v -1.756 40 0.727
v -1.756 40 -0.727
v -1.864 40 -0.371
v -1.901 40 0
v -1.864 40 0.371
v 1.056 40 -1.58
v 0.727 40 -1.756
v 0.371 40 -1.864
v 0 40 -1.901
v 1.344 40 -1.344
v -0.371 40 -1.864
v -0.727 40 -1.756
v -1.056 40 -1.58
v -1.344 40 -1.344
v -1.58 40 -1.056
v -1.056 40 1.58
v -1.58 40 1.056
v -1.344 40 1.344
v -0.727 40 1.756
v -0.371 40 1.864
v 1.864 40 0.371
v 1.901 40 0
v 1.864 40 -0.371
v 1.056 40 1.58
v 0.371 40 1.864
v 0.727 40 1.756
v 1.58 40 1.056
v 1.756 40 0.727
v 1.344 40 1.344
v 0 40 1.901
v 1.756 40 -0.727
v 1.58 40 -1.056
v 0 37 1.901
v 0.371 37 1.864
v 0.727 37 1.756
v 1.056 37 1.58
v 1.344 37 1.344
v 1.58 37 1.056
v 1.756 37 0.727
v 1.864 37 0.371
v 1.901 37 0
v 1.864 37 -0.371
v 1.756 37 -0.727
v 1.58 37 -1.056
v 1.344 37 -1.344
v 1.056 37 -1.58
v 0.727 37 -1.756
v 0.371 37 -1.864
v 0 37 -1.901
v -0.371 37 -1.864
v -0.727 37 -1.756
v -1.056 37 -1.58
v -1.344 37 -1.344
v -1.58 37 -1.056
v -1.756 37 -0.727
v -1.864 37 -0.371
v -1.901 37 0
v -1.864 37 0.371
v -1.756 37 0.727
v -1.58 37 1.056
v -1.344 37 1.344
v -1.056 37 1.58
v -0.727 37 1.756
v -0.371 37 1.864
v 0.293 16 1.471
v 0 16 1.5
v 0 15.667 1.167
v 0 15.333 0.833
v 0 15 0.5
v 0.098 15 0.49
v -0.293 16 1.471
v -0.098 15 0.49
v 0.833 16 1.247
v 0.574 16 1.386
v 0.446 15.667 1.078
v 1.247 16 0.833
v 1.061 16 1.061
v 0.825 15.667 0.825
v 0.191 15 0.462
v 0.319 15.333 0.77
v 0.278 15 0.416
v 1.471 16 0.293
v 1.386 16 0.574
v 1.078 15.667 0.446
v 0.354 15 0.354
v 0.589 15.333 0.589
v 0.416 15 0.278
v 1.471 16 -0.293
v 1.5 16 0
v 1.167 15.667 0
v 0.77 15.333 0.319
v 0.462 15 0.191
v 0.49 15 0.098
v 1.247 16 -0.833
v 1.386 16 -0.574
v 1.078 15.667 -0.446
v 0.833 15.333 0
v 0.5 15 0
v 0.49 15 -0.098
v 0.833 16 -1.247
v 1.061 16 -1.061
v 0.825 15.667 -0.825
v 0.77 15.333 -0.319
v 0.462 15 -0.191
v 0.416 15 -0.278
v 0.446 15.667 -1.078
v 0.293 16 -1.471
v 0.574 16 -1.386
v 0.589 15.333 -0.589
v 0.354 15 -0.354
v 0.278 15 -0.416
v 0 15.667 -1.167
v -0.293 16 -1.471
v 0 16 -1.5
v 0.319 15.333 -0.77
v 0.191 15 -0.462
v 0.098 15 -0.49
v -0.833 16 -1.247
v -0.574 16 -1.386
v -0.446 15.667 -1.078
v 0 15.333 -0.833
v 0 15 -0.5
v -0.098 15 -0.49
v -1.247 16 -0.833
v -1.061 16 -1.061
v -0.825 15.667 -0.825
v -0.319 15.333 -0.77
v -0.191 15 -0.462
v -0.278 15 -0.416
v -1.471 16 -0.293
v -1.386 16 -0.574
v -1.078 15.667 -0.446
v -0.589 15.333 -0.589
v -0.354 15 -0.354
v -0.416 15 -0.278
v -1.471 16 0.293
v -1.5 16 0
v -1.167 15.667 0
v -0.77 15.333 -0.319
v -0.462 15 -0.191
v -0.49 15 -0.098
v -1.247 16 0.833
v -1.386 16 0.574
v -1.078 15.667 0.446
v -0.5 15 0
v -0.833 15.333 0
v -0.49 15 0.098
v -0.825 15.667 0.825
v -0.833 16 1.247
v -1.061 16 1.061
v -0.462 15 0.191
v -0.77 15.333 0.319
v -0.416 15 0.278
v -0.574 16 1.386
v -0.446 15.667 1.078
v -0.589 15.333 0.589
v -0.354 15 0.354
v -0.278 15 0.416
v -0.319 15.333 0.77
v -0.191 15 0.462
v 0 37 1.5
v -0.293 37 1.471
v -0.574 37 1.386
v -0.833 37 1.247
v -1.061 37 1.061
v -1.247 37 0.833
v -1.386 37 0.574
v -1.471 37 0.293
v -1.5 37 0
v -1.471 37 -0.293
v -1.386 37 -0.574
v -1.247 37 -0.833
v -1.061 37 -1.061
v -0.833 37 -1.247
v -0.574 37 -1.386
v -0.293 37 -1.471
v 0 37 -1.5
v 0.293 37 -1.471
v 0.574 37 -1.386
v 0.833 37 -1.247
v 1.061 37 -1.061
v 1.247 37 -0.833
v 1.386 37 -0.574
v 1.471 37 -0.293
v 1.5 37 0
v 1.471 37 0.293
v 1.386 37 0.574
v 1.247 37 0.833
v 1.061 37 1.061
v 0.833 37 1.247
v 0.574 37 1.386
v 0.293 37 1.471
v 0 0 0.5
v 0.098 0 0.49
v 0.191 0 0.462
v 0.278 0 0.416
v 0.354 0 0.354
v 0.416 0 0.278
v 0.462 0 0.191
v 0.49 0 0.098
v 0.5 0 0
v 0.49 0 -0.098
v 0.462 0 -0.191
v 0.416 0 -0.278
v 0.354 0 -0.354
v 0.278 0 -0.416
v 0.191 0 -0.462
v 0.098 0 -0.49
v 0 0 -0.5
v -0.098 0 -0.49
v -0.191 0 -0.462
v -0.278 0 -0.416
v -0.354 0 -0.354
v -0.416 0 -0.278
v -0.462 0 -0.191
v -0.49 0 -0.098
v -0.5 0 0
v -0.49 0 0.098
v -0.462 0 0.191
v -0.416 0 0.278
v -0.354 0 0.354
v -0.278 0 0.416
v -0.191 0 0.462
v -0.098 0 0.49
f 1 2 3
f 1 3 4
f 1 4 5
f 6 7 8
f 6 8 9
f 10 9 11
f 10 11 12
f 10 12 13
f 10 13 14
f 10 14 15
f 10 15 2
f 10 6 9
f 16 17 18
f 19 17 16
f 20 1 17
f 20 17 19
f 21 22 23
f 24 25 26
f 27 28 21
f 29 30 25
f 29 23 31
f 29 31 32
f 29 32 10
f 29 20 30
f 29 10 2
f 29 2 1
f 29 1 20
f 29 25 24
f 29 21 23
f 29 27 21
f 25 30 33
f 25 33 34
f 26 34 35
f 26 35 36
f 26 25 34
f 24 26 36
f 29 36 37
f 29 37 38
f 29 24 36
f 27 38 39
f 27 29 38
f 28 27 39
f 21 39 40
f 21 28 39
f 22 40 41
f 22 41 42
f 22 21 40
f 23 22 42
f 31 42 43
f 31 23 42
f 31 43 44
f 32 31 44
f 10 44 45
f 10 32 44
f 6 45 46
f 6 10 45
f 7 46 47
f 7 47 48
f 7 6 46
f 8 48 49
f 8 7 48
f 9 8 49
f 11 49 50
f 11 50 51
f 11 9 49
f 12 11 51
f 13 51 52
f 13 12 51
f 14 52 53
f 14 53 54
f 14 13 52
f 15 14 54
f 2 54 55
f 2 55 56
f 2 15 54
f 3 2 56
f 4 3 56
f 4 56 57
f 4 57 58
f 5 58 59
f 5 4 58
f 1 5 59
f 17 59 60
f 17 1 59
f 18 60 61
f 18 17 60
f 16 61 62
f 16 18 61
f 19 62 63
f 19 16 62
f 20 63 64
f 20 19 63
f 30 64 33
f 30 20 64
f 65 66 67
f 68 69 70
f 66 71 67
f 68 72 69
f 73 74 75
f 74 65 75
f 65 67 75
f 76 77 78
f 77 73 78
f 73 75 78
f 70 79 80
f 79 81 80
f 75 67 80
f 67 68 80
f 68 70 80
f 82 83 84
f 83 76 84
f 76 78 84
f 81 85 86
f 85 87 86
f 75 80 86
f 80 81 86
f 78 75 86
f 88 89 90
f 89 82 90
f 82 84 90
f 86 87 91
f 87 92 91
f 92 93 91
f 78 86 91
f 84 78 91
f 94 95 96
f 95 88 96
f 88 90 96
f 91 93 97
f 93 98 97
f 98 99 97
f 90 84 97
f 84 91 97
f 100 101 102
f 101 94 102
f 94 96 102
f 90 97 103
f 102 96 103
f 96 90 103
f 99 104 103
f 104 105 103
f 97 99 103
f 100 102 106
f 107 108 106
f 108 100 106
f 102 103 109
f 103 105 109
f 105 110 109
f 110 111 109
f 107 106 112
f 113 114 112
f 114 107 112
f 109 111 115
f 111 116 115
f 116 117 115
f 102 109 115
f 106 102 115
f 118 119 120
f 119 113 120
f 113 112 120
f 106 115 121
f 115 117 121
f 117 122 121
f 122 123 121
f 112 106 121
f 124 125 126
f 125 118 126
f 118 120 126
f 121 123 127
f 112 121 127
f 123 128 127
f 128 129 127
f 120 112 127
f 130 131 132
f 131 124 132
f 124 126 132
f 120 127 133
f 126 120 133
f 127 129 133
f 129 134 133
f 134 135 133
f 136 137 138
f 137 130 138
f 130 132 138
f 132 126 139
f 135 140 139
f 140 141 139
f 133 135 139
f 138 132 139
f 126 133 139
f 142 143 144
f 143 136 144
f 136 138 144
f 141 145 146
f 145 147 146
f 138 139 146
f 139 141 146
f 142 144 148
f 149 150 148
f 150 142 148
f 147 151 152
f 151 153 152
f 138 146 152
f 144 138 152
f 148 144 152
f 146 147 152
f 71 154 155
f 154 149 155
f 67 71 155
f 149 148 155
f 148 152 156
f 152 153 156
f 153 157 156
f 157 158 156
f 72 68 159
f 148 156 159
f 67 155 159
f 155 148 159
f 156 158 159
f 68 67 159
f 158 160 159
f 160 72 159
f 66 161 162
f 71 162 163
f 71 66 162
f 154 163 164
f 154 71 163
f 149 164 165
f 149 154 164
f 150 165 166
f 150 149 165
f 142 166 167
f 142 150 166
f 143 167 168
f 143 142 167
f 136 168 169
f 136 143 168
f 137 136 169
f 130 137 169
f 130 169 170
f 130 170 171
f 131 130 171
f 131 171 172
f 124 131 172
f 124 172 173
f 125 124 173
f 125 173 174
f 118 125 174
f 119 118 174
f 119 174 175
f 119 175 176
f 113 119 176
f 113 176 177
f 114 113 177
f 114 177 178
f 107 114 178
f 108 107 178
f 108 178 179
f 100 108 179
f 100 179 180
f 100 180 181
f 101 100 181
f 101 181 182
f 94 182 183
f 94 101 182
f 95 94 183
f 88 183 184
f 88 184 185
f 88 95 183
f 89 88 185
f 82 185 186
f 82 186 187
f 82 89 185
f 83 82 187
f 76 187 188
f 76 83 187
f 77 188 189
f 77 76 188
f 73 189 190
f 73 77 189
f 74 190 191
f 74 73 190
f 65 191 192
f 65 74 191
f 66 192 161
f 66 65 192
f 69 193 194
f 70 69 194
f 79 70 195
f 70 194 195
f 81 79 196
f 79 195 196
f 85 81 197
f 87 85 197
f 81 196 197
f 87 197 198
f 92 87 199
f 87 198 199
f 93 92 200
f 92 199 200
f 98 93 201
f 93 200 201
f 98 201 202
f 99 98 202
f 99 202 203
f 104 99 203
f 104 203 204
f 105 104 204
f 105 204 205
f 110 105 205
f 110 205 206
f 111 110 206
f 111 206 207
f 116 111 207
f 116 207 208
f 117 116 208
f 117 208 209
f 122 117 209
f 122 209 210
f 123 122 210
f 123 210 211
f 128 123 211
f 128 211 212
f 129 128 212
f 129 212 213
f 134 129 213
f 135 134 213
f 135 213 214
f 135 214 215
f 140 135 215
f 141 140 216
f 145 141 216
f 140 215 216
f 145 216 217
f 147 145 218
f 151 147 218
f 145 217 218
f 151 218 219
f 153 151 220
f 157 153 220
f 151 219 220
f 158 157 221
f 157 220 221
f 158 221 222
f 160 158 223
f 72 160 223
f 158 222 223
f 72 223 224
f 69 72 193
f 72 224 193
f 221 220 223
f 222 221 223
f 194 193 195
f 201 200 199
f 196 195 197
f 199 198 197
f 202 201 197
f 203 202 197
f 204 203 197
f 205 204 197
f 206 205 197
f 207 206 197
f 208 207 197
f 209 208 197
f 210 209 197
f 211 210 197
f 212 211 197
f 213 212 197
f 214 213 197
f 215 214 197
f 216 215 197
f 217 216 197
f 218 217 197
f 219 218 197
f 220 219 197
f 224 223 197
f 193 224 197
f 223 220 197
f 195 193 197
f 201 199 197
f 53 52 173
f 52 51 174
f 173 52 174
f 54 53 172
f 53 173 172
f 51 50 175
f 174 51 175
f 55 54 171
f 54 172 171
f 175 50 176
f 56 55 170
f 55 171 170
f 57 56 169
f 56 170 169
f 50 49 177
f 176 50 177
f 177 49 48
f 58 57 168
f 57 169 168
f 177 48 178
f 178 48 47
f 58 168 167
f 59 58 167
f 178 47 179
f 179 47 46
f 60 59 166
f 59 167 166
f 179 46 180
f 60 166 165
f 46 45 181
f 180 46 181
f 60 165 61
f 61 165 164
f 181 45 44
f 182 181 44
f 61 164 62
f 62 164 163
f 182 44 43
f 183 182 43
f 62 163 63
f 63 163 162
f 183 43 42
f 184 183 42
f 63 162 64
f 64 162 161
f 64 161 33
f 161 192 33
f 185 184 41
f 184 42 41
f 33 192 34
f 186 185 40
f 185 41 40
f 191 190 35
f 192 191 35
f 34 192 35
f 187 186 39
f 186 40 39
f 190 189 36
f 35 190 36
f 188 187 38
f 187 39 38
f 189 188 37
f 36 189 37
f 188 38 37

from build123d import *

# Parameters (mm, degrees)
SKETCH3_R           = 0.5
BOSS_EXTRUDE4_DEPTH = 25
SKETCH5_R           = 1.5
BOSS_EXTRUDE5_DEPTH = 15
CHAMFER2_SIZE       = 10
SKETCH6_R           = 1.900672983
BOSS_EXTRUDE6_DEPTH = 3


with BuildPart() as part:
    # Sketch3 → Boss-Extrude4 (new body)
    with BuildSketch(Plane(origin=(0, 0, 0), x_dir=(1, 0, 0), z_dir=(0, 1, 0))):
        with Locations(Location((0, 0, 0), (0, 0, 270))):
            Circle(SKETCH3_R)
    extrude(amount=BOSS_EXTRUDE4_DEPTH)

    # Sketch5 → Boss-Extrude5 (add)
    with BuildSketch(Plane(origin=(0, 25, 0), x_dir=(1, 0, 0), z_dir=(0, 1, 0))):
        with Locations(Location((0, 0, 0), (0, 0, 270))):
            Circle(SKETCH5_R)
    extrude(amount=BOSS_EXTRUDE5_DEPTH)

    # Chamfer2
    # the kernel refuses this chamfer: 10 mm, written as the material it adds along each edge
    with BuildSketch(Plane(origin=(0, 25, 0), x_dir=(0, 0, 1), z_dir=(-1, 0, 0))) as chamfer2_piece_1_section:
        Polygon((0.5 + CHAMFER2_SIZE, 0), (0.5, -CHAMFER2_SIZE), (0.5, 0), align=None)
    chamfer2_piece_1 = revolve(axis=Axis((0, 25, 0), (0, 1, 0)), mode=Mode.PRIVATE)
    chamfer2_piece_1 = chamfer2_piece_1 & Plane(origin=(0, 15.387158422, 0), x_dir=(0, 0, 1), z_dir=(0, -1, 0)) * Cylinder(1.5, 42, mode=Mode.PRIVATE)
    add(chamfer2_piece_1)

    # Sketch6 → Boss-Extrude6 (add)
    with BuildSketch(Plane(origin=(0, 40, 0), x_dir=(1, 0, 0), z_dir=(0, 1, 0))):
        with Locations(Location((0, 0, 0), (0, 0, 270))):
            Circle(SKETCH6_R)
    extrude(amount=-BOSS_EXTRUDE6_DEPTH)


solid = part.part
